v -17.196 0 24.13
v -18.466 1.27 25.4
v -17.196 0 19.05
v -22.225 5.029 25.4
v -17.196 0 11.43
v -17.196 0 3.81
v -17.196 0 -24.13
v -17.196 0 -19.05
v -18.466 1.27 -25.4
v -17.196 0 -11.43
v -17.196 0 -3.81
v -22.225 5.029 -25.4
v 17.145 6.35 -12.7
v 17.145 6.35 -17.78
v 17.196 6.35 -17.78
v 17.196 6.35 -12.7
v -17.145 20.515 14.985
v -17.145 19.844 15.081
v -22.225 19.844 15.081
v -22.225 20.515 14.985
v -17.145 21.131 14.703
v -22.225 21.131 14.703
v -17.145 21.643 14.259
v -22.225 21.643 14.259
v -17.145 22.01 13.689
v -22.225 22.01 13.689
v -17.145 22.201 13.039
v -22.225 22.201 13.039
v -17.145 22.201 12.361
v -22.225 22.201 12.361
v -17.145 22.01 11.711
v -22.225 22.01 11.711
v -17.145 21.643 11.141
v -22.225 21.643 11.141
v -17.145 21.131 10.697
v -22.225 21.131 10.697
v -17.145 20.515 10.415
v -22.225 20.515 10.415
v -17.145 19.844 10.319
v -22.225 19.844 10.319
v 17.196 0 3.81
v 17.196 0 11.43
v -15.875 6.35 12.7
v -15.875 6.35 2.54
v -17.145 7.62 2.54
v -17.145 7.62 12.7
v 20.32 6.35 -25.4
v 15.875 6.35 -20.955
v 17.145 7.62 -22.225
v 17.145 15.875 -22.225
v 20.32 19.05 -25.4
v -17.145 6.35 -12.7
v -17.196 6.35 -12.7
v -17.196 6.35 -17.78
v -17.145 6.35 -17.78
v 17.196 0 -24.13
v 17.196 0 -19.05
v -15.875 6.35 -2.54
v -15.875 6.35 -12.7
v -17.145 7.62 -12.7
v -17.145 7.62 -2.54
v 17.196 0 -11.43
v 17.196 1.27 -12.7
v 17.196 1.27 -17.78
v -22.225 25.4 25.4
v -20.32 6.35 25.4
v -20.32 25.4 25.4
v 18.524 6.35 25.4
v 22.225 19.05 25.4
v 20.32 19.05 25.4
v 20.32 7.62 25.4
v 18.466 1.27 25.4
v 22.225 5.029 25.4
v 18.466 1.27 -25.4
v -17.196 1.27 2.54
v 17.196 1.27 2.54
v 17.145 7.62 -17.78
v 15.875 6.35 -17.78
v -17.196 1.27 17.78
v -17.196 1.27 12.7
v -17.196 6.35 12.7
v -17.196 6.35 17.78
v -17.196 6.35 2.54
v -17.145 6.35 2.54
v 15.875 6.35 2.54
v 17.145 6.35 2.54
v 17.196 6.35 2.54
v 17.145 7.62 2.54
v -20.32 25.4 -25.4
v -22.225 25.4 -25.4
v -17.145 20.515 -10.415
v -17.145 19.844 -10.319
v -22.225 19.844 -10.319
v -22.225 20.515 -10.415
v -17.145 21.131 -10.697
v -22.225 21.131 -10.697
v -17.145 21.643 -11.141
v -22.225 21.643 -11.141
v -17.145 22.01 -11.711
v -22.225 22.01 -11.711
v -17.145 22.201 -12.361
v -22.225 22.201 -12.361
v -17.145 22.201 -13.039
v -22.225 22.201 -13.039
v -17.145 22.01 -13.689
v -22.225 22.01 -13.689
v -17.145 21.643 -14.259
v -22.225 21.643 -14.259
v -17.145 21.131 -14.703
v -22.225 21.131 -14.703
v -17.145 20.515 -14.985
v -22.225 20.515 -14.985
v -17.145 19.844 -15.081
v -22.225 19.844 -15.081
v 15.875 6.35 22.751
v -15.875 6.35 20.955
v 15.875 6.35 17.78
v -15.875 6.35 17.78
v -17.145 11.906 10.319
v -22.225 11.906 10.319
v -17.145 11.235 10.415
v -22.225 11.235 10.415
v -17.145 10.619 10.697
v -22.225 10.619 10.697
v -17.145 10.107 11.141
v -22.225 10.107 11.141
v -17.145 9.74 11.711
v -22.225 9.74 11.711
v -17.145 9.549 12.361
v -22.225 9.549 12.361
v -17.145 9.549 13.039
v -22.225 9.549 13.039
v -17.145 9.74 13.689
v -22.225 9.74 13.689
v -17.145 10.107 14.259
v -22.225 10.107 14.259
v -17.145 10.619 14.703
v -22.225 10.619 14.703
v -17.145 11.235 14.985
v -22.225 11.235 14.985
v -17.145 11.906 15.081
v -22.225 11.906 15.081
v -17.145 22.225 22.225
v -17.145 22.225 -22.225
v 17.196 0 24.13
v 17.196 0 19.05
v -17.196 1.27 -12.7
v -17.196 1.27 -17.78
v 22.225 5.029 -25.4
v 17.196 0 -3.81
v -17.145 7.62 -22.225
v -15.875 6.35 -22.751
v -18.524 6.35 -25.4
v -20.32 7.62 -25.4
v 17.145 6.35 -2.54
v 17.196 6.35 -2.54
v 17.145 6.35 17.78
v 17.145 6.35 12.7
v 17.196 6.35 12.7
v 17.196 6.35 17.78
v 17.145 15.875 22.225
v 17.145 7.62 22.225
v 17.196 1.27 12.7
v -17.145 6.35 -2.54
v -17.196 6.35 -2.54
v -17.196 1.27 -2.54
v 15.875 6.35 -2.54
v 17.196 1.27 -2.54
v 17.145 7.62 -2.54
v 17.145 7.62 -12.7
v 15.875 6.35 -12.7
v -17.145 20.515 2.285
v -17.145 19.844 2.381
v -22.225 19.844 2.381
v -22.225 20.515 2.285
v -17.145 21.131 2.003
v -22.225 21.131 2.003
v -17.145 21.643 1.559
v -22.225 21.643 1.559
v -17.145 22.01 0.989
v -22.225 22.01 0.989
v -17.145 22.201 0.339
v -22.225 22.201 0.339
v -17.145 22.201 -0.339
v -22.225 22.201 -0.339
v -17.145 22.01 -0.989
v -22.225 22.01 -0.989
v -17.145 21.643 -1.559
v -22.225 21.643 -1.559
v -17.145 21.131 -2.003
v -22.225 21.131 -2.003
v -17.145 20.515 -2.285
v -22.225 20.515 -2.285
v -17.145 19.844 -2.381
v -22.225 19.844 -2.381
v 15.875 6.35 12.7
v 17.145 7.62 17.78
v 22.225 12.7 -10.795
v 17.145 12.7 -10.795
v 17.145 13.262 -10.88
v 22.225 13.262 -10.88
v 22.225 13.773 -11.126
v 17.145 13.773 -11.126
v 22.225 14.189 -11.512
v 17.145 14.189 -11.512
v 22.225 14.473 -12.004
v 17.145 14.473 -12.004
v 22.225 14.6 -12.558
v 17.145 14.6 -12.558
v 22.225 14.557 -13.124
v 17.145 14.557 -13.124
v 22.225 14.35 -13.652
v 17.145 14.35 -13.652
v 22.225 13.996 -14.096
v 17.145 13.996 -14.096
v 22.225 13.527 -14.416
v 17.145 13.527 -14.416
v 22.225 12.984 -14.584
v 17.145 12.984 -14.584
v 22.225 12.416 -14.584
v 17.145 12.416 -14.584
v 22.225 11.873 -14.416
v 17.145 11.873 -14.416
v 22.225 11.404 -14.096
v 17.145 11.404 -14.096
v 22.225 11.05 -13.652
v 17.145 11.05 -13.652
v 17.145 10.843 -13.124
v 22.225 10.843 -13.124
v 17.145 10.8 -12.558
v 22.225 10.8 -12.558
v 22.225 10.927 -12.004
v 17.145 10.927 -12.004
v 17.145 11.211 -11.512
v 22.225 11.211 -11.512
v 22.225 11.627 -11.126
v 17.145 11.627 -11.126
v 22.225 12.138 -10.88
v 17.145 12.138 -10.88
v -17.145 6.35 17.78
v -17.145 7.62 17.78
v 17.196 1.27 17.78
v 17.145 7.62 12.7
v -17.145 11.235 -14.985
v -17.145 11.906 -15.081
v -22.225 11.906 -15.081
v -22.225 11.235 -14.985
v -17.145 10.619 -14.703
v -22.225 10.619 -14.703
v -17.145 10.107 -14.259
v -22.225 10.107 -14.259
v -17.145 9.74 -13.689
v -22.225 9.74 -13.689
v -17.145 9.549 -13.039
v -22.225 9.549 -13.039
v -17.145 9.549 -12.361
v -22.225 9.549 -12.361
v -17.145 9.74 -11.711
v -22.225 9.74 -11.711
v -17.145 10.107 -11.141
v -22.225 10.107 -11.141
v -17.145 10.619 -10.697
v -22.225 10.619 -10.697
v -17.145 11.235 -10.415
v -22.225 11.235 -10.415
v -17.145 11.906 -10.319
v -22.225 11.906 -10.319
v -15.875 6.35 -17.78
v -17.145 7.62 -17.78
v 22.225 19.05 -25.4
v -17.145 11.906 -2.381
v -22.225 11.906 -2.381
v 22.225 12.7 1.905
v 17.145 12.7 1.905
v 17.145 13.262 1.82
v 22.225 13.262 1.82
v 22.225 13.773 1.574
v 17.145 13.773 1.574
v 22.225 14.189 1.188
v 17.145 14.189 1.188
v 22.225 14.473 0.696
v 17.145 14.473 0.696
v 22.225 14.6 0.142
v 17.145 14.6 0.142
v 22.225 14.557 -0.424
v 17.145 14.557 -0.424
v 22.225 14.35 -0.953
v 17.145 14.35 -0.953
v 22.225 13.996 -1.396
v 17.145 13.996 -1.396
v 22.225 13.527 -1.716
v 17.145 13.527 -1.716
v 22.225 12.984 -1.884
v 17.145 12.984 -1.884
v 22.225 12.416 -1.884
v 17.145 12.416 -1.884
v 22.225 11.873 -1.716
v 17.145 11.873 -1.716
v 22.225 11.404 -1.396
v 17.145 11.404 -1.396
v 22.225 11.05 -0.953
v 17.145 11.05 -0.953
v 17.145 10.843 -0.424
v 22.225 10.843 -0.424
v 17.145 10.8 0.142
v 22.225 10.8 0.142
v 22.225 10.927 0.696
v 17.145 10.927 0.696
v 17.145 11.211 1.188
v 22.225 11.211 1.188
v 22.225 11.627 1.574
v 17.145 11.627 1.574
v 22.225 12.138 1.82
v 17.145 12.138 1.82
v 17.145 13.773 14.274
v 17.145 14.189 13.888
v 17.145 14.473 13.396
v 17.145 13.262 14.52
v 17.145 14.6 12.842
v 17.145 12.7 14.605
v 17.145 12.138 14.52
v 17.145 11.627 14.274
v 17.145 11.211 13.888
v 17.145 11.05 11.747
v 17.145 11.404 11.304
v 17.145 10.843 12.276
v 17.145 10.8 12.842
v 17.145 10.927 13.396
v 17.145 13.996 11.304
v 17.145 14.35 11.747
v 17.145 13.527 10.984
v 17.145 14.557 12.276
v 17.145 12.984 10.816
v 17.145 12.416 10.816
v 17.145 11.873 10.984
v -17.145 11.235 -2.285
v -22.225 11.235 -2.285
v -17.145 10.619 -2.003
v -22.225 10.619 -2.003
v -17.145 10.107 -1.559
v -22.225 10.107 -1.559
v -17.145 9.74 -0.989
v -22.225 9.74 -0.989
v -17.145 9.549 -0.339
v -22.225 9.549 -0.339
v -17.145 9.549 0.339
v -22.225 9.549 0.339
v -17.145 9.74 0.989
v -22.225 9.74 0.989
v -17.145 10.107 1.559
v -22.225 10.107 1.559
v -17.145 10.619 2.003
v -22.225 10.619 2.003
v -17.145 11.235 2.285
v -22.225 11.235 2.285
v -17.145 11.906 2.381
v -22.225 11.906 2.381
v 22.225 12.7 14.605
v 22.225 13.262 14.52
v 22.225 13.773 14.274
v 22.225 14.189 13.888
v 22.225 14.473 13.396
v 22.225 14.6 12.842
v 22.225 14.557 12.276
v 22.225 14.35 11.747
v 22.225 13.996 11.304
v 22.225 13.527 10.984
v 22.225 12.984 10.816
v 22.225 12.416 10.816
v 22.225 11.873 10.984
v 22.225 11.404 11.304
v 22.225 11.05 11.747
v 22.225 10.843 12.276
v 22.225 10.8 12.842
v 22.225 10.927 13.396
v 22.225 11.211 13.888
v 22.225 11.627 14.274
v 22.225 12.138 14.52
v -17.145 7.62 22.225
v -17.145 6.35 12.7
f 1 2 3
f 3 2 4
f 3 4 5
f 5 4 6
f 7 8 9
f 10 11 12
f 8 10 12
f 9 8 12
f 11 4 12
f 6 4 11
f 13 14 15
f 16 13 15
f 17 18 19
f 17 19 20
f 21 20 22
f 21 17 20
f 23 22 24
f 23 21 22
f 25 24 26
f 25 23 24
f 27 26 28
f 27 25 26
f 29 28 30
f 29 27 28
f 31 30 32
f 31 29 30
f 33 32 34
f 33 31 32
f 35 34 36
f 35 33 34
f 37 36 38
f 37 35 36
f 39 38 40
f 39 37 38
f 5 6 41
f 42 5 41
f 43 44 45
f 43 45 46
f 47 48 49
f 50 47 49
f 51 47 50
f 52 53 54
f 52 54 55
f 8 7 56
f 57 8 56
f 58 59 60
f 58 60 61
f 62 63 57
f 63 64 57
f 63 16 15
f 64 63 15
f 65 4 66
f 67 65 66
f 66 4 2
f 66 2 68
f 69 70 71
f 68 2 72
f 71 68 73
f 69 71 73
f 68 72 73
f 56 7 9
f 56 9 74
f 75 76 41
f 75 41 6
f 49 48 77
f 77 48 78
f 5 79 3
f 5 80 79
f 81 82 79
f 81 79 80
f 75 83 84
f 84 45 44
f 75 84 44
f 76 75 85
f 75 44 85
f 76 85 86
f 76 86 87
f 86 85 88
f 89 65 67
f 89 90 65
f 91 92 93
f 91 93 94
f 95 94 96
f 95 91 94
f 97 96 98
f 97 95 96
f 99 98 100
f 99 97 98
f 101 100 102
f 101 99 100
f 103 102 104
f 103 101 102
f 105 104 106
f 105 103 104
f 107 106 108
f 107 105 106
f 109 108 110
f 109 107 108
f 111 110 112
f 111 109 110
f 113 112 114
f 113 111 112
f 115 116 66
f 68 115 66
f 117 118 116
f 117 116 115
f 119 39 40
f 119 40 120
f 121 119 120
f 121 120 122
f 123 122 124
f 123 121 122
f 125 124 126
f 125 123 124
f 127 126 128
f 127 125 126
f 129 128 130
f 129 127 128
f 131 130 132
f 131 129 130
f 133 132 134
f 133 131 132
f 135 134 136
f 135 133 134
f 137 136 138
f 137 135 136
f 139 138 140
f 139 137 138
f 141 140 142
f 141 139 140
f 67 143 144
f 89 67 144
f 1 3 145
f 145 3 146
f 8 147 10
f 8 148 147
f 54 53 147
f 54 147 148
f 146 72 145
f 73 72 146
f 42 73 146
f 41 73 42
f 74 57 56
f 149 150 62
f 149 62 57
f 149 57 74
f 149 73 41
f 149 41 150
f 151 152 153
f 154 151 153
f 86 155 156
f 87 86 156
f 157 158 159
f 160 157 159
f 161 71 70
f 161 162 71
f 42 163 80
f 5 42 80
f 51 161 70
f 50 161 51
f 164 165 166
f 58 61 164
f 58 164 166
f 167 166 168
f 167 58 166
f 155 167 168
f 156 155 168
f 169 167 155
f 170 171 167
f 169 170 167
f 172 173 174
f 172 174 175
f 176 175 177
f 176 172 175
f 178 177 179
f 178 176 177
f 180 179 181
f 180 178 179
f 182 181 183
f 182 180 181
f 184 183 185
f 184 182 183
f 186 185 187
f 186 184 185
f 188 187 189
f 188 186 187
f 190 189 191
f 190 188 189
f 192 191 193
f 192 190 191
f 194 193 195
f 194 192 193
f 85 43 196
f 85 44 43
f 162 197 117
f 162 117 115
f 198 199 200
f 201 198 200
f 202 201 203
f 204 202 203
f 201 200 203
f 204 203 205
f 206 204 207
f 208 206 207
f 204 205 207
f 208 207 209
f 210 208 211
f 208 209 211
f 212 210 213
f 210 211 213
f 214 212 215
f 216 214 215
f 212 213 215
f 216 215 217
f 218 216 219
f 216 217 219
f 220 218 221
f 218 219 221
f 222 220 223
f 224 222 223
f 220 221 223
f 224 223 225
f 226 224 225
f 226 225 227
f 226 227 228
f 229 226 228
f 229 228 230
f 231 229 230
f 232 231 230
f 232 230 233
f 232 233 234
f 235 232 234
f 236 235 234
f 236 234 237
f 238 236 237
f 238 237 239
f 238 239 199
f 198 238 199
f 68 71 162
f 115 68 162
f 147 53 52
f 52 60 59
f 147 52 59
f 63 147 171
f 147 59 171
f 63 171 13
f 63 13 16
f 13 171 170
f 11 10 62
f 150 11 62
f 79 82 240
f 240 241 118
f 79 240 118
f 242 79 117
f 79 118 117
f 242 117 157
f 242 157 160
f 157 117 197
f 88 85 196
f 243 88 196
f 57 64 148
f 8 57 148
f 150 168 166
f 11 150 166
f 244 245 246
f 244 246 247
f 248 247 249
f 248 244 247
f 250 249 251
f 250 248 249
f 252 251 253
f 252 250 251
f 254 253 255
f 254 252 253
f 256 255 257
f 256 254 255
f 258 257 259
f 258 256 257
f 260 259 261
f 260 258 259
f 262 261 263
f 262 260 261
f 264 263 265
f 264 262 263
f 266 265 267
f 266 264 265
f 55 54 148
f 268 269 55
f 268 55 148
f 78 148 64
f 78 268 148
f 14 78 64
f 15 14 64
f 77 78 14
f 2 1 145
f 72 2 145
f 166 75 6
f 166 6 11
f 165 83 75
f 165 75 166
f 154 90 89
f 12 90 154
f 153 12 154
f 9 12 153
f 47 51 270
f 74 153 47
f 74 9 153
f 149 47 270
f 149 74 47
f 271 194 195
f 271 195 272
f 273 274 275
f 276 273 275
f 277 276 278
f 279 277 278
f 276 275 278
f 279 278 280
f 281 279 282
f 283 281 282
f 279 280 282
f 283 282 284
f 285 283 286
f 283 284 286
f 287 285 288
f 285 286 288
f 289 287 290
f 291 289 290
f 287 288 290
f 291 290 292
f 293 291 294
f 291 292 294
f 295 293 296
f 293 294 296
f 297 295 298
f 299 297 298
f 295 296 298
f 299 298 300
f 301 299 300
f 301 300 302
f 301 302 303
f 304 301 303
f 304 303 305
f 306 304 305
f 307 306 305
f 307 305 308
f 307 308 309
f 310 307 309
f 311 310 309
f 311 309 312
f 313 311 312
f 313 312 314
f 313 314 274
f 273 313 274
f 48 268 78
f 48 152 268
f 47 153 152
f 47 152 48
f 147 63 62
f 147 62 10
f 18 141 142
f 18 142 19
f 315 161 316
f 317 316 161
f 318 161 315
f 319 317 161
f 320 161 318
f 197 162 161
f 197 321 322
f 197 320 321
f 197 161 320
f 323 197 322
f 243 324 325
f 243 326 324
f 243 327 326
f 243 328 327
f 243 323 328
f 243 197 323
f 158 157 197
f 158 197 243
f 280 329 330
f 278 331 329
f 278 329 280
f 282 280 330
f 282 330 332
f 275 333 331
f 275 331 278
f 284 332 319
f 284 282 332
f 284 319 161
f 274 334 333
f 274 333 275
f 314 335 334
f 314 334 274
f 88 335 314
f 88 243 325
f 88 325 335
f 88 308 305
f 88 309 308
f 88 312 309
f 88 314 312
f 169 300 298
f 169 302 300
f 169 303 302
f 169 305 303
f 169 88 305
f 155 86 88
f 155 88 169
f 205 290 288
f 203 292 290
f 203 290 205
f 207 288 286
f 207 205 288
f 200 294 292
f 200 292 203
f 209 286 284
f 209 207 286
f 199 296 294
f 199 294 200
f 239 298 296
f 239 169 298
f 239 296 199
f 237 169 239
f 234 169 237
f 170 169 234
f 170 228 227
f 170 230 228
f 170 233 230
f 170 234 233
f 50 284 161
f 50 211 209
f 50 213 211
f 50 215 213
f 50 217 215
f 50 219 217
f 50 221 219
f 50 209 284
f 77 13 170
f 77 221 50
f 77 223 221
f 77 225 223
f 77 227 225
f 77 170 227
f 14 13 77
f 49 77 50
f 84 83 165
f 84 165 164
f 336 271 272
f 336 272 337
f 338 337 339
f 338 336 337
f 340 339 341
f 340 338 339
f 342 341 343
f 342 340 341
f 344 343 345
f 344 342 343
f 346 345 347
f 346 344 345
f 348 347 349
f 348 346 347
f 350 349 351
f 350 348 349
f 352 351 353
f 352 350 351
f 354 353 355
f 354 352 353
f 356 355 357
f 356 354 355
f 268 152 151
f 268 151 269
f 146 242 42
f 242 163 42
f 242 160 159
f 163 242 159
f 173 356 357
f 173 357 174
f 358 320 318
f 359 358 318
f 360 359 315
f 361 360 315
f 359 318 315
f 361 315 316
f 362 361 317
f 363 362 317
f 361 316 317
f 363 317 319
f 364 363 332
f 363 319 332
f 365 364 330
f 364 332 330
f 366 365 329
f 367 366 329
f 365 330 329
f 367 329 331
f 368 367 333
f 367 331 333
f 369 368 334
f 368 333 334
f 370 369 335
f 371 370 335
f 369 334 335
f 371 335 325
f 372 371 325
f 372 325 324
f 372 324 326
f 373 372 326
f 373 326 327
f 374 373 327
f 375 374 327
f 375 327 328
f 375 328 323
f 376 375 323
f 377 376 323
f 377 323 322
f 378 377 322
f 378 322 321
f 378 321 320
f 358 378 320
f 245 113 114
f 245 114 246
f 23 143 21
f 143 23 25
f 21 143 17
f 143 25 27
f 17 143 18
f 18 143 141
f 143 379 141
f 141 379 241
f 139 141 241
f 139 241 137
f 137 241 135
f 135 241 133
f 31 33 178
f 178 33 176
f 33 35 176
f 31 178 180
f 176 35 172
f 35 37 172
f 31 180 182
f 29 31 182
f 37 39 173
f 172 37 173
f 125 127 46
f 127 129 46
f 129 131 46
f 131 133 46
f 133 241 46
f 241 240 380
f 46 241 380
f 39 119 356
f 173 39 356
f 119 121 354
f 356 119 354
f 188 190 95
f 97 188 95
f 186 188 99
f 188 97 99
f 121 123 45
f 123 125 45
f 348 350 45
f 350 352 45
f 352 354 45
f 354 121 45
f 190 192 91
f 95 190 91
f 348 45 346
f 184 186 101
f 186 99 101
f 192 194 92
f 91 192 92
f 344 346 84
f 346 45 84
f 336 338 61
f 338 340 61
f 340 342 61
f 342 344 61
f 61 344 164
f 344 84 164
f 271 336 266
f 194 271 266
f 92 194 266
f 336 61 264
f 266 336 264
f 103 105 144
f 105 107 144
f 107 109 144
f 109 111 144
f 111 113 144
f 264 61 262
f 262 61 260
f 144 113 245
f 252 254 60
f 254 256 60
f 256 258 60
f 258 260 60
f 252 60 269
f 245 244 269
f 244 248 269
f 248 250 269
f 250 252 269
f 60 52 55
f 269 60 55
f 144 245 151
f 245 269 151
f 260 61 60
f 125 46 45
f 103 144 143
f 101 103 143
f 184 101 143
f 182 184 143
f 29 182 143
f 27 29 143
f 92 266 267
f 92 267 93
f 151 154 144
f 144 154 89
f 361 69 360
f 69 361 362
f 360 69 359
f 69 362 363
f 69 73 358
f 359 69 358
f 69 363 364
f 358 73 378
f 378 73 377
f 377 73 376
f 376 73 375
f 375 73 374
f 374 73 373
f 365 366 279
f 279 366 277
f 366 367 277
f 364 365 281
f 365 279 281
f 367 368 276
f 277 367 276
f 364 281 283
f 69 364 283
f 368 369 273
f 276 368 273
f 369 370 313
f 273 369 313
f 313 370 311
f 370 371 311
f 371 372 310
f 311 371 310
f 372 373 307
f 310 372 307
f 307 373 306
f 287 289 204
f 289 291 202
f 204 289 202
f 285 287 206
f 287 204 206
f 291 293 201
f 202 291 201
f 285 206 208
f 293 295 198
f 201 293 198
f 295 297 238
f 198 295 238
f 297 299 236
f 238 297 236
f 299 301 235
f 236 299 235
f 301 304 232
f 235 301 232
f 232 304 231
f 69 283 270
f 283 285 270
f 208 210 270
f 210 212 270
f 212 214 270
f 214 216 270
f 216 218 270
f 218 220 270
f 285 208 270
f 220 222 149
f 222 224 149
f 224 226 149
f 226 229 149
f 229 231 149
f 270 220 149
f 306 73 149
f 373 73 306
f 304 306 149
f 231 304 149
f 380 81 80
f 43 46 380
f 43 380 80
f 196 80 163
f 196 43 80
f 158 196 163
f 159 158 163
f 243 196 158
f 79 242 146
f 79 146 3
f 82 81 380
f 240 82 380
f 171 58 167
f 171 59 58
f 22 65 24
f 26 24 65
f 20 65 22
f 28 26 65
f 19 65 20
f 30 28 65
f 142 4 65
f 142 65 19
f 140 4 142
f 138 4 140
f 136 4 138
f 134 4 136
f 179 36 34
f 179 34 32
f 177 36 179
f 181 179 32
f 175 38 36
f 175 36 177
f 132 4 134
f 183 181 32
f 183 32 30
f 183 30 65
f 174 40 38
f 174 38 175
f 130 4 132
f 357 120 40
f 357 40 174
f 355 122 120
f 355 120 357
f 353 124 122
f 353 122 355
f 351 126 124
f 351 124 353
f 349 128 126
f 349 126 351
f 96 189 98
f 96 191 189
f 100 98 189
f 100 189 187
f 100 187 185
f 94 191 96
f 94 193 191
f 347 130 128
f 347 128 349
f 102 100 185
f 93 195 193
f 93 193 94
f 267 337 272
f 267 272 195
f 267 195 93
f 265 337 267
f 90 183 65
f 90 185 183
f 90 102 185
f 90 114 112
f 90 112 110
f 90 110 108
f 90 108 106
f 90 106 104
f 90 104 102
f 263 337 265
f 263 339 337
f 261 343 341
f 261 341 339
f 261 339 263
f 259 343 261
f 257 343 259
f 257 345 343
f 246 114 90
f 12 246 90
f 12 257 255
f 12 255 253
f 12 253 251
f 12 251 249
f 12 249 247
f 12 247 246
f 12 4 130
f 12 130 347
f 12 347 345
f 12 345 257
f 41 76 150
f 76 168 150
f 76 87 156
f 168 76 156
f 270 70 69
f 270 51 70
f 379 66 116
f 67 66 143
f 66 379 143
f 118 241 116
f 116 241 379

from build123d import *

# Parameters (mm, degrees)
SKETCH1_W           = 44.45
SKETCH1_H           = 50.8
BOSS_EXTRUDE1_DEPTH = 6.35
SKETCH2_W           = 5.08
SKETCH2_H           = 50.8
BOSS_EXTRUDE2_DEPTH = 25.4
SKETCH3_W           = 5.08
SKETCH3_H           = 50.8
BOSS_EXTRUDE3_DEPTH = 19.05
CUT_EXTRUDE1_REACH  = 55.295
CUT_EXTRUDE2_REACH  = 55.295
SKETCH5_R           = 1.905
LPATTERN1_COUNT     = 2
LPATTERN1_PITCH     = 12.7
LPATTERN1_COL_COUNT = 2
LPATTERN1_COL_PITCH = 12.7
CHAMFER3_SIZE       = 5.028946
CHAMFER1_SIZE       = 3.175
CUT_EXTRUDE3_REACH  = 40.756
SKETCH6_W           = 34.392108
SKETCH6_H           = 5.08
LPATTERN2_COUNT     = 2
LPATTERN2_PITCH     = 15.24
LPATTERN2_COL_COUNT = 2
LPATTERN2_COL_PITCH = 15.24
CHAMFER4_SIZE       = 1.27


with BuildPart() as part:
    # Sketch1 → Boss-Extrude1 (new body)
    with BuildSketch(Plane(origin=(0, 0, 0), x_dir=(1, 0, 0), z_dir=(0, 1, 0))):
        Rectangle(SKETCH1_W, SKETCH1_H)
    extrude(amount=BOSS_EXTRUDE1_DEPTH)

    # Sketch2 → Boss-Extrude2 (add)
    with BuildSketch(Plane(origin=(0, 0, 0), x_dir=(1, 0, 0), z_dir=(0, 1, 0))):
        with Locations((-19.685, 0)):
            Rectangle(SKETCH2_W, SKETCH2_H)
    extrude(amount=BOSS_EXTRUDE2_DEPTH)

    # Sketch3 → Boss-Extrude3 (add)
    with BuildSketch(Plane(origin=(0, 0, 0), x_dir=(1, 0, 0), z_dir=(0, 1, 0))):
        with Locations((19.685, 0)):
            Rectangle(SKETCH3_W, SKETCH3_H)
    extrude(amount=BOSS_EXTRUDE3_DEPTH)

    # Sketch4 → Cut-Extrude1 (cut, up to next)
    with BuildSketch(Plane(origin=(-17.145, 0, 0), x_dir=(0, 0, -1), z_dir=(1, 0, 0)), mode=Mode.PRIVATE) as cut_extrude1_sk1:
        with BuildLine():
            Line((-2.38125, 11.90625), (-2.38125, 19.84375))
            ThreePointArc((-2.38125, 19.84375), (0, 22.225), (2.38125, 19.84375))
            Line((2.38125, 19.84375), (2.38125, 11.90625))
            ThreePointArc((2.38125, 11.90625), (0, 9.525), (-2.38125, 11.90625))
        make_face()
    cut_extrude1_tool1 = extrude(cut_extrude1_sk1.sketch, amount=-CUT_EXTRUDE1_REACH, mode=Mode.PRIVATE) & part.part
    cut_extrude1 = cut_extrude1_tool1.solids().sort_by_distance((-17.145, 15.875, 0))[0]
    add(cut_extrude1, mode=Mode.SUBTRACT)

    # Sketch5 → Cut-Extrude2 (cut, up to next)
    with BuildSketch(Plane.ZY.offset(-17.145), mode=Mode.PRIVATE) as cut_extrude2_sk1:
        with Locations((0, 12.7)):
            Circle(SKETCH5_R)
    cut_extrude2_tool1 = extrude(cut_extrude2_sk1.sketch, amount=-CUT_EXTRUDE2_REACH, mode=Mode.PRIVATE) & part.part
    cut_extrude2 = cut_extrude2_tool1.solids().sort_by_distance((17.145, 12.7, 0))[0]
    add(cut_extrude2, mode=Mode.SUBTRACT)

    # LPattern1: Cut-Extrude1, Cut-Extrude2 ×2
    with Locations(*[(0, 0, i * LPATTERN1_PITCH) for i in range(1, LPATTERN1_COUNT)]):
        add(cut_extrude1, mode=Mode.SUBTRACT)
        add(cut_extrude2, mode=Mode.SUBTRACT)

    # LPattern1 col: Cut-Extrude1, Cut-Extrude2 ×2
    with Locations(*[(0, 0, -i * LPATTERN1_COL_PITCH) for i in range(1, LPATTERN1_COL_COUNT)]):
        add(cut_extrude1, mode=Mode.SUBTRACT)
        add(cut_extrude2, mode=Mode.SUBTRACT)

    # Chamfer3
    chamfer3_edges = [part.edges().sort_by_distance(p)[0] for p in [
        (22.225, 0, 0),
        (-22.225, 0, 0),
    ]]
    chamfer(chamfer3_edges, length=CHAMFER3_SIZE)

    # Chamfer1
    chamfer1_edges = [part.edges().sort_by_distance(p)[0] for p in [
        (-17.145, 15.875, 25.4),
        (-17.145, 15.875, -25.4),
        (-17.145, 25.4, 0),
        (17.145, 12.7, -25.4),
        (17.145, 12.7, 25.4),
        (17.145, 19.05, 0),
    ]]
    chamfer(chamfer1_edges, length=CHAMFER1_SIZE - 0.0001)  # a hair under: the kernel refuses the full size

    # Sketch6 → Cut-Extrude3 (cut, up to next)
    with BuildSketch(Plane(origin=(0, 6.35, 0), x_dir=(1, 0, 0), z_dir=(0, 1, 0)), mode=Mode.PRIVATE) as cut_extrude3_sk1:
        Rectangle(SKETCH6_W, SKETCH6_H)
    cut_extrude3_tool1 = extrude(cut_extrude3_sk1.sketch, amount=-CUT_EXTRUDE3_REACH, mode=Mode.PRIVATE) & part.part
    cut_extrude3 = cut_extrude3_tool1.solids().sort_by_distance((0, 6.35, 0))[0]
    add(cut_extrude3, mode=Mode.SUBTRACT)

    # LPattern2: Cut-Extrude3 ×2
    with Locations(*[(0, 0, i * LPATTERN2_PITCH) for i in range(1, LPATTERN2_COUNT)]):
        add(cut_extrude3, mode=Mode.SUBTRACT)

    # LPattern2 col: Cut-Extrude3 ×2
    with Locations(*[(0, 0, -i * LPATTERN2_COL_PITCH) for i in range(1, LPATTERN2_COL_COUNT)]):
        add(cut_extrude3, mode=Mode.SUBTRACT)

    # Chamfer4
    chamfer4_edges = [part.edges().sort_by_distance(p)[0] for p in [
        (0, 0, 25.4),
        (0, 0, -25.4),
        (17.145, 6.35, -20.00255),
        (-17.145, 6.35, 20.00255),
        (18.73245, 6.35, 23.81255),
        (-18.73245, 6.35, -23.81255),
        (17.145, 6.35, 7.62),
        (-17.145, 6.35, -7.62),
        (0, 0, 2.54),
        (0, 0, -2.54),
        (17.145, 6.35, -7.62),
        (-17.145, 6.35, -20.00255),
        (0, 0, -12.7),
        (0, 0, -17.78),
        (17.145, 6.35, 20.00255),
        (-17.145, 6.35, 7.62),
        (0, 0, 17.78),
        (0, 0, 12.7),
    ]]
    chamfer(chamfer4_edges, length=CHAMFER4_SIZE)


solid = part.part
